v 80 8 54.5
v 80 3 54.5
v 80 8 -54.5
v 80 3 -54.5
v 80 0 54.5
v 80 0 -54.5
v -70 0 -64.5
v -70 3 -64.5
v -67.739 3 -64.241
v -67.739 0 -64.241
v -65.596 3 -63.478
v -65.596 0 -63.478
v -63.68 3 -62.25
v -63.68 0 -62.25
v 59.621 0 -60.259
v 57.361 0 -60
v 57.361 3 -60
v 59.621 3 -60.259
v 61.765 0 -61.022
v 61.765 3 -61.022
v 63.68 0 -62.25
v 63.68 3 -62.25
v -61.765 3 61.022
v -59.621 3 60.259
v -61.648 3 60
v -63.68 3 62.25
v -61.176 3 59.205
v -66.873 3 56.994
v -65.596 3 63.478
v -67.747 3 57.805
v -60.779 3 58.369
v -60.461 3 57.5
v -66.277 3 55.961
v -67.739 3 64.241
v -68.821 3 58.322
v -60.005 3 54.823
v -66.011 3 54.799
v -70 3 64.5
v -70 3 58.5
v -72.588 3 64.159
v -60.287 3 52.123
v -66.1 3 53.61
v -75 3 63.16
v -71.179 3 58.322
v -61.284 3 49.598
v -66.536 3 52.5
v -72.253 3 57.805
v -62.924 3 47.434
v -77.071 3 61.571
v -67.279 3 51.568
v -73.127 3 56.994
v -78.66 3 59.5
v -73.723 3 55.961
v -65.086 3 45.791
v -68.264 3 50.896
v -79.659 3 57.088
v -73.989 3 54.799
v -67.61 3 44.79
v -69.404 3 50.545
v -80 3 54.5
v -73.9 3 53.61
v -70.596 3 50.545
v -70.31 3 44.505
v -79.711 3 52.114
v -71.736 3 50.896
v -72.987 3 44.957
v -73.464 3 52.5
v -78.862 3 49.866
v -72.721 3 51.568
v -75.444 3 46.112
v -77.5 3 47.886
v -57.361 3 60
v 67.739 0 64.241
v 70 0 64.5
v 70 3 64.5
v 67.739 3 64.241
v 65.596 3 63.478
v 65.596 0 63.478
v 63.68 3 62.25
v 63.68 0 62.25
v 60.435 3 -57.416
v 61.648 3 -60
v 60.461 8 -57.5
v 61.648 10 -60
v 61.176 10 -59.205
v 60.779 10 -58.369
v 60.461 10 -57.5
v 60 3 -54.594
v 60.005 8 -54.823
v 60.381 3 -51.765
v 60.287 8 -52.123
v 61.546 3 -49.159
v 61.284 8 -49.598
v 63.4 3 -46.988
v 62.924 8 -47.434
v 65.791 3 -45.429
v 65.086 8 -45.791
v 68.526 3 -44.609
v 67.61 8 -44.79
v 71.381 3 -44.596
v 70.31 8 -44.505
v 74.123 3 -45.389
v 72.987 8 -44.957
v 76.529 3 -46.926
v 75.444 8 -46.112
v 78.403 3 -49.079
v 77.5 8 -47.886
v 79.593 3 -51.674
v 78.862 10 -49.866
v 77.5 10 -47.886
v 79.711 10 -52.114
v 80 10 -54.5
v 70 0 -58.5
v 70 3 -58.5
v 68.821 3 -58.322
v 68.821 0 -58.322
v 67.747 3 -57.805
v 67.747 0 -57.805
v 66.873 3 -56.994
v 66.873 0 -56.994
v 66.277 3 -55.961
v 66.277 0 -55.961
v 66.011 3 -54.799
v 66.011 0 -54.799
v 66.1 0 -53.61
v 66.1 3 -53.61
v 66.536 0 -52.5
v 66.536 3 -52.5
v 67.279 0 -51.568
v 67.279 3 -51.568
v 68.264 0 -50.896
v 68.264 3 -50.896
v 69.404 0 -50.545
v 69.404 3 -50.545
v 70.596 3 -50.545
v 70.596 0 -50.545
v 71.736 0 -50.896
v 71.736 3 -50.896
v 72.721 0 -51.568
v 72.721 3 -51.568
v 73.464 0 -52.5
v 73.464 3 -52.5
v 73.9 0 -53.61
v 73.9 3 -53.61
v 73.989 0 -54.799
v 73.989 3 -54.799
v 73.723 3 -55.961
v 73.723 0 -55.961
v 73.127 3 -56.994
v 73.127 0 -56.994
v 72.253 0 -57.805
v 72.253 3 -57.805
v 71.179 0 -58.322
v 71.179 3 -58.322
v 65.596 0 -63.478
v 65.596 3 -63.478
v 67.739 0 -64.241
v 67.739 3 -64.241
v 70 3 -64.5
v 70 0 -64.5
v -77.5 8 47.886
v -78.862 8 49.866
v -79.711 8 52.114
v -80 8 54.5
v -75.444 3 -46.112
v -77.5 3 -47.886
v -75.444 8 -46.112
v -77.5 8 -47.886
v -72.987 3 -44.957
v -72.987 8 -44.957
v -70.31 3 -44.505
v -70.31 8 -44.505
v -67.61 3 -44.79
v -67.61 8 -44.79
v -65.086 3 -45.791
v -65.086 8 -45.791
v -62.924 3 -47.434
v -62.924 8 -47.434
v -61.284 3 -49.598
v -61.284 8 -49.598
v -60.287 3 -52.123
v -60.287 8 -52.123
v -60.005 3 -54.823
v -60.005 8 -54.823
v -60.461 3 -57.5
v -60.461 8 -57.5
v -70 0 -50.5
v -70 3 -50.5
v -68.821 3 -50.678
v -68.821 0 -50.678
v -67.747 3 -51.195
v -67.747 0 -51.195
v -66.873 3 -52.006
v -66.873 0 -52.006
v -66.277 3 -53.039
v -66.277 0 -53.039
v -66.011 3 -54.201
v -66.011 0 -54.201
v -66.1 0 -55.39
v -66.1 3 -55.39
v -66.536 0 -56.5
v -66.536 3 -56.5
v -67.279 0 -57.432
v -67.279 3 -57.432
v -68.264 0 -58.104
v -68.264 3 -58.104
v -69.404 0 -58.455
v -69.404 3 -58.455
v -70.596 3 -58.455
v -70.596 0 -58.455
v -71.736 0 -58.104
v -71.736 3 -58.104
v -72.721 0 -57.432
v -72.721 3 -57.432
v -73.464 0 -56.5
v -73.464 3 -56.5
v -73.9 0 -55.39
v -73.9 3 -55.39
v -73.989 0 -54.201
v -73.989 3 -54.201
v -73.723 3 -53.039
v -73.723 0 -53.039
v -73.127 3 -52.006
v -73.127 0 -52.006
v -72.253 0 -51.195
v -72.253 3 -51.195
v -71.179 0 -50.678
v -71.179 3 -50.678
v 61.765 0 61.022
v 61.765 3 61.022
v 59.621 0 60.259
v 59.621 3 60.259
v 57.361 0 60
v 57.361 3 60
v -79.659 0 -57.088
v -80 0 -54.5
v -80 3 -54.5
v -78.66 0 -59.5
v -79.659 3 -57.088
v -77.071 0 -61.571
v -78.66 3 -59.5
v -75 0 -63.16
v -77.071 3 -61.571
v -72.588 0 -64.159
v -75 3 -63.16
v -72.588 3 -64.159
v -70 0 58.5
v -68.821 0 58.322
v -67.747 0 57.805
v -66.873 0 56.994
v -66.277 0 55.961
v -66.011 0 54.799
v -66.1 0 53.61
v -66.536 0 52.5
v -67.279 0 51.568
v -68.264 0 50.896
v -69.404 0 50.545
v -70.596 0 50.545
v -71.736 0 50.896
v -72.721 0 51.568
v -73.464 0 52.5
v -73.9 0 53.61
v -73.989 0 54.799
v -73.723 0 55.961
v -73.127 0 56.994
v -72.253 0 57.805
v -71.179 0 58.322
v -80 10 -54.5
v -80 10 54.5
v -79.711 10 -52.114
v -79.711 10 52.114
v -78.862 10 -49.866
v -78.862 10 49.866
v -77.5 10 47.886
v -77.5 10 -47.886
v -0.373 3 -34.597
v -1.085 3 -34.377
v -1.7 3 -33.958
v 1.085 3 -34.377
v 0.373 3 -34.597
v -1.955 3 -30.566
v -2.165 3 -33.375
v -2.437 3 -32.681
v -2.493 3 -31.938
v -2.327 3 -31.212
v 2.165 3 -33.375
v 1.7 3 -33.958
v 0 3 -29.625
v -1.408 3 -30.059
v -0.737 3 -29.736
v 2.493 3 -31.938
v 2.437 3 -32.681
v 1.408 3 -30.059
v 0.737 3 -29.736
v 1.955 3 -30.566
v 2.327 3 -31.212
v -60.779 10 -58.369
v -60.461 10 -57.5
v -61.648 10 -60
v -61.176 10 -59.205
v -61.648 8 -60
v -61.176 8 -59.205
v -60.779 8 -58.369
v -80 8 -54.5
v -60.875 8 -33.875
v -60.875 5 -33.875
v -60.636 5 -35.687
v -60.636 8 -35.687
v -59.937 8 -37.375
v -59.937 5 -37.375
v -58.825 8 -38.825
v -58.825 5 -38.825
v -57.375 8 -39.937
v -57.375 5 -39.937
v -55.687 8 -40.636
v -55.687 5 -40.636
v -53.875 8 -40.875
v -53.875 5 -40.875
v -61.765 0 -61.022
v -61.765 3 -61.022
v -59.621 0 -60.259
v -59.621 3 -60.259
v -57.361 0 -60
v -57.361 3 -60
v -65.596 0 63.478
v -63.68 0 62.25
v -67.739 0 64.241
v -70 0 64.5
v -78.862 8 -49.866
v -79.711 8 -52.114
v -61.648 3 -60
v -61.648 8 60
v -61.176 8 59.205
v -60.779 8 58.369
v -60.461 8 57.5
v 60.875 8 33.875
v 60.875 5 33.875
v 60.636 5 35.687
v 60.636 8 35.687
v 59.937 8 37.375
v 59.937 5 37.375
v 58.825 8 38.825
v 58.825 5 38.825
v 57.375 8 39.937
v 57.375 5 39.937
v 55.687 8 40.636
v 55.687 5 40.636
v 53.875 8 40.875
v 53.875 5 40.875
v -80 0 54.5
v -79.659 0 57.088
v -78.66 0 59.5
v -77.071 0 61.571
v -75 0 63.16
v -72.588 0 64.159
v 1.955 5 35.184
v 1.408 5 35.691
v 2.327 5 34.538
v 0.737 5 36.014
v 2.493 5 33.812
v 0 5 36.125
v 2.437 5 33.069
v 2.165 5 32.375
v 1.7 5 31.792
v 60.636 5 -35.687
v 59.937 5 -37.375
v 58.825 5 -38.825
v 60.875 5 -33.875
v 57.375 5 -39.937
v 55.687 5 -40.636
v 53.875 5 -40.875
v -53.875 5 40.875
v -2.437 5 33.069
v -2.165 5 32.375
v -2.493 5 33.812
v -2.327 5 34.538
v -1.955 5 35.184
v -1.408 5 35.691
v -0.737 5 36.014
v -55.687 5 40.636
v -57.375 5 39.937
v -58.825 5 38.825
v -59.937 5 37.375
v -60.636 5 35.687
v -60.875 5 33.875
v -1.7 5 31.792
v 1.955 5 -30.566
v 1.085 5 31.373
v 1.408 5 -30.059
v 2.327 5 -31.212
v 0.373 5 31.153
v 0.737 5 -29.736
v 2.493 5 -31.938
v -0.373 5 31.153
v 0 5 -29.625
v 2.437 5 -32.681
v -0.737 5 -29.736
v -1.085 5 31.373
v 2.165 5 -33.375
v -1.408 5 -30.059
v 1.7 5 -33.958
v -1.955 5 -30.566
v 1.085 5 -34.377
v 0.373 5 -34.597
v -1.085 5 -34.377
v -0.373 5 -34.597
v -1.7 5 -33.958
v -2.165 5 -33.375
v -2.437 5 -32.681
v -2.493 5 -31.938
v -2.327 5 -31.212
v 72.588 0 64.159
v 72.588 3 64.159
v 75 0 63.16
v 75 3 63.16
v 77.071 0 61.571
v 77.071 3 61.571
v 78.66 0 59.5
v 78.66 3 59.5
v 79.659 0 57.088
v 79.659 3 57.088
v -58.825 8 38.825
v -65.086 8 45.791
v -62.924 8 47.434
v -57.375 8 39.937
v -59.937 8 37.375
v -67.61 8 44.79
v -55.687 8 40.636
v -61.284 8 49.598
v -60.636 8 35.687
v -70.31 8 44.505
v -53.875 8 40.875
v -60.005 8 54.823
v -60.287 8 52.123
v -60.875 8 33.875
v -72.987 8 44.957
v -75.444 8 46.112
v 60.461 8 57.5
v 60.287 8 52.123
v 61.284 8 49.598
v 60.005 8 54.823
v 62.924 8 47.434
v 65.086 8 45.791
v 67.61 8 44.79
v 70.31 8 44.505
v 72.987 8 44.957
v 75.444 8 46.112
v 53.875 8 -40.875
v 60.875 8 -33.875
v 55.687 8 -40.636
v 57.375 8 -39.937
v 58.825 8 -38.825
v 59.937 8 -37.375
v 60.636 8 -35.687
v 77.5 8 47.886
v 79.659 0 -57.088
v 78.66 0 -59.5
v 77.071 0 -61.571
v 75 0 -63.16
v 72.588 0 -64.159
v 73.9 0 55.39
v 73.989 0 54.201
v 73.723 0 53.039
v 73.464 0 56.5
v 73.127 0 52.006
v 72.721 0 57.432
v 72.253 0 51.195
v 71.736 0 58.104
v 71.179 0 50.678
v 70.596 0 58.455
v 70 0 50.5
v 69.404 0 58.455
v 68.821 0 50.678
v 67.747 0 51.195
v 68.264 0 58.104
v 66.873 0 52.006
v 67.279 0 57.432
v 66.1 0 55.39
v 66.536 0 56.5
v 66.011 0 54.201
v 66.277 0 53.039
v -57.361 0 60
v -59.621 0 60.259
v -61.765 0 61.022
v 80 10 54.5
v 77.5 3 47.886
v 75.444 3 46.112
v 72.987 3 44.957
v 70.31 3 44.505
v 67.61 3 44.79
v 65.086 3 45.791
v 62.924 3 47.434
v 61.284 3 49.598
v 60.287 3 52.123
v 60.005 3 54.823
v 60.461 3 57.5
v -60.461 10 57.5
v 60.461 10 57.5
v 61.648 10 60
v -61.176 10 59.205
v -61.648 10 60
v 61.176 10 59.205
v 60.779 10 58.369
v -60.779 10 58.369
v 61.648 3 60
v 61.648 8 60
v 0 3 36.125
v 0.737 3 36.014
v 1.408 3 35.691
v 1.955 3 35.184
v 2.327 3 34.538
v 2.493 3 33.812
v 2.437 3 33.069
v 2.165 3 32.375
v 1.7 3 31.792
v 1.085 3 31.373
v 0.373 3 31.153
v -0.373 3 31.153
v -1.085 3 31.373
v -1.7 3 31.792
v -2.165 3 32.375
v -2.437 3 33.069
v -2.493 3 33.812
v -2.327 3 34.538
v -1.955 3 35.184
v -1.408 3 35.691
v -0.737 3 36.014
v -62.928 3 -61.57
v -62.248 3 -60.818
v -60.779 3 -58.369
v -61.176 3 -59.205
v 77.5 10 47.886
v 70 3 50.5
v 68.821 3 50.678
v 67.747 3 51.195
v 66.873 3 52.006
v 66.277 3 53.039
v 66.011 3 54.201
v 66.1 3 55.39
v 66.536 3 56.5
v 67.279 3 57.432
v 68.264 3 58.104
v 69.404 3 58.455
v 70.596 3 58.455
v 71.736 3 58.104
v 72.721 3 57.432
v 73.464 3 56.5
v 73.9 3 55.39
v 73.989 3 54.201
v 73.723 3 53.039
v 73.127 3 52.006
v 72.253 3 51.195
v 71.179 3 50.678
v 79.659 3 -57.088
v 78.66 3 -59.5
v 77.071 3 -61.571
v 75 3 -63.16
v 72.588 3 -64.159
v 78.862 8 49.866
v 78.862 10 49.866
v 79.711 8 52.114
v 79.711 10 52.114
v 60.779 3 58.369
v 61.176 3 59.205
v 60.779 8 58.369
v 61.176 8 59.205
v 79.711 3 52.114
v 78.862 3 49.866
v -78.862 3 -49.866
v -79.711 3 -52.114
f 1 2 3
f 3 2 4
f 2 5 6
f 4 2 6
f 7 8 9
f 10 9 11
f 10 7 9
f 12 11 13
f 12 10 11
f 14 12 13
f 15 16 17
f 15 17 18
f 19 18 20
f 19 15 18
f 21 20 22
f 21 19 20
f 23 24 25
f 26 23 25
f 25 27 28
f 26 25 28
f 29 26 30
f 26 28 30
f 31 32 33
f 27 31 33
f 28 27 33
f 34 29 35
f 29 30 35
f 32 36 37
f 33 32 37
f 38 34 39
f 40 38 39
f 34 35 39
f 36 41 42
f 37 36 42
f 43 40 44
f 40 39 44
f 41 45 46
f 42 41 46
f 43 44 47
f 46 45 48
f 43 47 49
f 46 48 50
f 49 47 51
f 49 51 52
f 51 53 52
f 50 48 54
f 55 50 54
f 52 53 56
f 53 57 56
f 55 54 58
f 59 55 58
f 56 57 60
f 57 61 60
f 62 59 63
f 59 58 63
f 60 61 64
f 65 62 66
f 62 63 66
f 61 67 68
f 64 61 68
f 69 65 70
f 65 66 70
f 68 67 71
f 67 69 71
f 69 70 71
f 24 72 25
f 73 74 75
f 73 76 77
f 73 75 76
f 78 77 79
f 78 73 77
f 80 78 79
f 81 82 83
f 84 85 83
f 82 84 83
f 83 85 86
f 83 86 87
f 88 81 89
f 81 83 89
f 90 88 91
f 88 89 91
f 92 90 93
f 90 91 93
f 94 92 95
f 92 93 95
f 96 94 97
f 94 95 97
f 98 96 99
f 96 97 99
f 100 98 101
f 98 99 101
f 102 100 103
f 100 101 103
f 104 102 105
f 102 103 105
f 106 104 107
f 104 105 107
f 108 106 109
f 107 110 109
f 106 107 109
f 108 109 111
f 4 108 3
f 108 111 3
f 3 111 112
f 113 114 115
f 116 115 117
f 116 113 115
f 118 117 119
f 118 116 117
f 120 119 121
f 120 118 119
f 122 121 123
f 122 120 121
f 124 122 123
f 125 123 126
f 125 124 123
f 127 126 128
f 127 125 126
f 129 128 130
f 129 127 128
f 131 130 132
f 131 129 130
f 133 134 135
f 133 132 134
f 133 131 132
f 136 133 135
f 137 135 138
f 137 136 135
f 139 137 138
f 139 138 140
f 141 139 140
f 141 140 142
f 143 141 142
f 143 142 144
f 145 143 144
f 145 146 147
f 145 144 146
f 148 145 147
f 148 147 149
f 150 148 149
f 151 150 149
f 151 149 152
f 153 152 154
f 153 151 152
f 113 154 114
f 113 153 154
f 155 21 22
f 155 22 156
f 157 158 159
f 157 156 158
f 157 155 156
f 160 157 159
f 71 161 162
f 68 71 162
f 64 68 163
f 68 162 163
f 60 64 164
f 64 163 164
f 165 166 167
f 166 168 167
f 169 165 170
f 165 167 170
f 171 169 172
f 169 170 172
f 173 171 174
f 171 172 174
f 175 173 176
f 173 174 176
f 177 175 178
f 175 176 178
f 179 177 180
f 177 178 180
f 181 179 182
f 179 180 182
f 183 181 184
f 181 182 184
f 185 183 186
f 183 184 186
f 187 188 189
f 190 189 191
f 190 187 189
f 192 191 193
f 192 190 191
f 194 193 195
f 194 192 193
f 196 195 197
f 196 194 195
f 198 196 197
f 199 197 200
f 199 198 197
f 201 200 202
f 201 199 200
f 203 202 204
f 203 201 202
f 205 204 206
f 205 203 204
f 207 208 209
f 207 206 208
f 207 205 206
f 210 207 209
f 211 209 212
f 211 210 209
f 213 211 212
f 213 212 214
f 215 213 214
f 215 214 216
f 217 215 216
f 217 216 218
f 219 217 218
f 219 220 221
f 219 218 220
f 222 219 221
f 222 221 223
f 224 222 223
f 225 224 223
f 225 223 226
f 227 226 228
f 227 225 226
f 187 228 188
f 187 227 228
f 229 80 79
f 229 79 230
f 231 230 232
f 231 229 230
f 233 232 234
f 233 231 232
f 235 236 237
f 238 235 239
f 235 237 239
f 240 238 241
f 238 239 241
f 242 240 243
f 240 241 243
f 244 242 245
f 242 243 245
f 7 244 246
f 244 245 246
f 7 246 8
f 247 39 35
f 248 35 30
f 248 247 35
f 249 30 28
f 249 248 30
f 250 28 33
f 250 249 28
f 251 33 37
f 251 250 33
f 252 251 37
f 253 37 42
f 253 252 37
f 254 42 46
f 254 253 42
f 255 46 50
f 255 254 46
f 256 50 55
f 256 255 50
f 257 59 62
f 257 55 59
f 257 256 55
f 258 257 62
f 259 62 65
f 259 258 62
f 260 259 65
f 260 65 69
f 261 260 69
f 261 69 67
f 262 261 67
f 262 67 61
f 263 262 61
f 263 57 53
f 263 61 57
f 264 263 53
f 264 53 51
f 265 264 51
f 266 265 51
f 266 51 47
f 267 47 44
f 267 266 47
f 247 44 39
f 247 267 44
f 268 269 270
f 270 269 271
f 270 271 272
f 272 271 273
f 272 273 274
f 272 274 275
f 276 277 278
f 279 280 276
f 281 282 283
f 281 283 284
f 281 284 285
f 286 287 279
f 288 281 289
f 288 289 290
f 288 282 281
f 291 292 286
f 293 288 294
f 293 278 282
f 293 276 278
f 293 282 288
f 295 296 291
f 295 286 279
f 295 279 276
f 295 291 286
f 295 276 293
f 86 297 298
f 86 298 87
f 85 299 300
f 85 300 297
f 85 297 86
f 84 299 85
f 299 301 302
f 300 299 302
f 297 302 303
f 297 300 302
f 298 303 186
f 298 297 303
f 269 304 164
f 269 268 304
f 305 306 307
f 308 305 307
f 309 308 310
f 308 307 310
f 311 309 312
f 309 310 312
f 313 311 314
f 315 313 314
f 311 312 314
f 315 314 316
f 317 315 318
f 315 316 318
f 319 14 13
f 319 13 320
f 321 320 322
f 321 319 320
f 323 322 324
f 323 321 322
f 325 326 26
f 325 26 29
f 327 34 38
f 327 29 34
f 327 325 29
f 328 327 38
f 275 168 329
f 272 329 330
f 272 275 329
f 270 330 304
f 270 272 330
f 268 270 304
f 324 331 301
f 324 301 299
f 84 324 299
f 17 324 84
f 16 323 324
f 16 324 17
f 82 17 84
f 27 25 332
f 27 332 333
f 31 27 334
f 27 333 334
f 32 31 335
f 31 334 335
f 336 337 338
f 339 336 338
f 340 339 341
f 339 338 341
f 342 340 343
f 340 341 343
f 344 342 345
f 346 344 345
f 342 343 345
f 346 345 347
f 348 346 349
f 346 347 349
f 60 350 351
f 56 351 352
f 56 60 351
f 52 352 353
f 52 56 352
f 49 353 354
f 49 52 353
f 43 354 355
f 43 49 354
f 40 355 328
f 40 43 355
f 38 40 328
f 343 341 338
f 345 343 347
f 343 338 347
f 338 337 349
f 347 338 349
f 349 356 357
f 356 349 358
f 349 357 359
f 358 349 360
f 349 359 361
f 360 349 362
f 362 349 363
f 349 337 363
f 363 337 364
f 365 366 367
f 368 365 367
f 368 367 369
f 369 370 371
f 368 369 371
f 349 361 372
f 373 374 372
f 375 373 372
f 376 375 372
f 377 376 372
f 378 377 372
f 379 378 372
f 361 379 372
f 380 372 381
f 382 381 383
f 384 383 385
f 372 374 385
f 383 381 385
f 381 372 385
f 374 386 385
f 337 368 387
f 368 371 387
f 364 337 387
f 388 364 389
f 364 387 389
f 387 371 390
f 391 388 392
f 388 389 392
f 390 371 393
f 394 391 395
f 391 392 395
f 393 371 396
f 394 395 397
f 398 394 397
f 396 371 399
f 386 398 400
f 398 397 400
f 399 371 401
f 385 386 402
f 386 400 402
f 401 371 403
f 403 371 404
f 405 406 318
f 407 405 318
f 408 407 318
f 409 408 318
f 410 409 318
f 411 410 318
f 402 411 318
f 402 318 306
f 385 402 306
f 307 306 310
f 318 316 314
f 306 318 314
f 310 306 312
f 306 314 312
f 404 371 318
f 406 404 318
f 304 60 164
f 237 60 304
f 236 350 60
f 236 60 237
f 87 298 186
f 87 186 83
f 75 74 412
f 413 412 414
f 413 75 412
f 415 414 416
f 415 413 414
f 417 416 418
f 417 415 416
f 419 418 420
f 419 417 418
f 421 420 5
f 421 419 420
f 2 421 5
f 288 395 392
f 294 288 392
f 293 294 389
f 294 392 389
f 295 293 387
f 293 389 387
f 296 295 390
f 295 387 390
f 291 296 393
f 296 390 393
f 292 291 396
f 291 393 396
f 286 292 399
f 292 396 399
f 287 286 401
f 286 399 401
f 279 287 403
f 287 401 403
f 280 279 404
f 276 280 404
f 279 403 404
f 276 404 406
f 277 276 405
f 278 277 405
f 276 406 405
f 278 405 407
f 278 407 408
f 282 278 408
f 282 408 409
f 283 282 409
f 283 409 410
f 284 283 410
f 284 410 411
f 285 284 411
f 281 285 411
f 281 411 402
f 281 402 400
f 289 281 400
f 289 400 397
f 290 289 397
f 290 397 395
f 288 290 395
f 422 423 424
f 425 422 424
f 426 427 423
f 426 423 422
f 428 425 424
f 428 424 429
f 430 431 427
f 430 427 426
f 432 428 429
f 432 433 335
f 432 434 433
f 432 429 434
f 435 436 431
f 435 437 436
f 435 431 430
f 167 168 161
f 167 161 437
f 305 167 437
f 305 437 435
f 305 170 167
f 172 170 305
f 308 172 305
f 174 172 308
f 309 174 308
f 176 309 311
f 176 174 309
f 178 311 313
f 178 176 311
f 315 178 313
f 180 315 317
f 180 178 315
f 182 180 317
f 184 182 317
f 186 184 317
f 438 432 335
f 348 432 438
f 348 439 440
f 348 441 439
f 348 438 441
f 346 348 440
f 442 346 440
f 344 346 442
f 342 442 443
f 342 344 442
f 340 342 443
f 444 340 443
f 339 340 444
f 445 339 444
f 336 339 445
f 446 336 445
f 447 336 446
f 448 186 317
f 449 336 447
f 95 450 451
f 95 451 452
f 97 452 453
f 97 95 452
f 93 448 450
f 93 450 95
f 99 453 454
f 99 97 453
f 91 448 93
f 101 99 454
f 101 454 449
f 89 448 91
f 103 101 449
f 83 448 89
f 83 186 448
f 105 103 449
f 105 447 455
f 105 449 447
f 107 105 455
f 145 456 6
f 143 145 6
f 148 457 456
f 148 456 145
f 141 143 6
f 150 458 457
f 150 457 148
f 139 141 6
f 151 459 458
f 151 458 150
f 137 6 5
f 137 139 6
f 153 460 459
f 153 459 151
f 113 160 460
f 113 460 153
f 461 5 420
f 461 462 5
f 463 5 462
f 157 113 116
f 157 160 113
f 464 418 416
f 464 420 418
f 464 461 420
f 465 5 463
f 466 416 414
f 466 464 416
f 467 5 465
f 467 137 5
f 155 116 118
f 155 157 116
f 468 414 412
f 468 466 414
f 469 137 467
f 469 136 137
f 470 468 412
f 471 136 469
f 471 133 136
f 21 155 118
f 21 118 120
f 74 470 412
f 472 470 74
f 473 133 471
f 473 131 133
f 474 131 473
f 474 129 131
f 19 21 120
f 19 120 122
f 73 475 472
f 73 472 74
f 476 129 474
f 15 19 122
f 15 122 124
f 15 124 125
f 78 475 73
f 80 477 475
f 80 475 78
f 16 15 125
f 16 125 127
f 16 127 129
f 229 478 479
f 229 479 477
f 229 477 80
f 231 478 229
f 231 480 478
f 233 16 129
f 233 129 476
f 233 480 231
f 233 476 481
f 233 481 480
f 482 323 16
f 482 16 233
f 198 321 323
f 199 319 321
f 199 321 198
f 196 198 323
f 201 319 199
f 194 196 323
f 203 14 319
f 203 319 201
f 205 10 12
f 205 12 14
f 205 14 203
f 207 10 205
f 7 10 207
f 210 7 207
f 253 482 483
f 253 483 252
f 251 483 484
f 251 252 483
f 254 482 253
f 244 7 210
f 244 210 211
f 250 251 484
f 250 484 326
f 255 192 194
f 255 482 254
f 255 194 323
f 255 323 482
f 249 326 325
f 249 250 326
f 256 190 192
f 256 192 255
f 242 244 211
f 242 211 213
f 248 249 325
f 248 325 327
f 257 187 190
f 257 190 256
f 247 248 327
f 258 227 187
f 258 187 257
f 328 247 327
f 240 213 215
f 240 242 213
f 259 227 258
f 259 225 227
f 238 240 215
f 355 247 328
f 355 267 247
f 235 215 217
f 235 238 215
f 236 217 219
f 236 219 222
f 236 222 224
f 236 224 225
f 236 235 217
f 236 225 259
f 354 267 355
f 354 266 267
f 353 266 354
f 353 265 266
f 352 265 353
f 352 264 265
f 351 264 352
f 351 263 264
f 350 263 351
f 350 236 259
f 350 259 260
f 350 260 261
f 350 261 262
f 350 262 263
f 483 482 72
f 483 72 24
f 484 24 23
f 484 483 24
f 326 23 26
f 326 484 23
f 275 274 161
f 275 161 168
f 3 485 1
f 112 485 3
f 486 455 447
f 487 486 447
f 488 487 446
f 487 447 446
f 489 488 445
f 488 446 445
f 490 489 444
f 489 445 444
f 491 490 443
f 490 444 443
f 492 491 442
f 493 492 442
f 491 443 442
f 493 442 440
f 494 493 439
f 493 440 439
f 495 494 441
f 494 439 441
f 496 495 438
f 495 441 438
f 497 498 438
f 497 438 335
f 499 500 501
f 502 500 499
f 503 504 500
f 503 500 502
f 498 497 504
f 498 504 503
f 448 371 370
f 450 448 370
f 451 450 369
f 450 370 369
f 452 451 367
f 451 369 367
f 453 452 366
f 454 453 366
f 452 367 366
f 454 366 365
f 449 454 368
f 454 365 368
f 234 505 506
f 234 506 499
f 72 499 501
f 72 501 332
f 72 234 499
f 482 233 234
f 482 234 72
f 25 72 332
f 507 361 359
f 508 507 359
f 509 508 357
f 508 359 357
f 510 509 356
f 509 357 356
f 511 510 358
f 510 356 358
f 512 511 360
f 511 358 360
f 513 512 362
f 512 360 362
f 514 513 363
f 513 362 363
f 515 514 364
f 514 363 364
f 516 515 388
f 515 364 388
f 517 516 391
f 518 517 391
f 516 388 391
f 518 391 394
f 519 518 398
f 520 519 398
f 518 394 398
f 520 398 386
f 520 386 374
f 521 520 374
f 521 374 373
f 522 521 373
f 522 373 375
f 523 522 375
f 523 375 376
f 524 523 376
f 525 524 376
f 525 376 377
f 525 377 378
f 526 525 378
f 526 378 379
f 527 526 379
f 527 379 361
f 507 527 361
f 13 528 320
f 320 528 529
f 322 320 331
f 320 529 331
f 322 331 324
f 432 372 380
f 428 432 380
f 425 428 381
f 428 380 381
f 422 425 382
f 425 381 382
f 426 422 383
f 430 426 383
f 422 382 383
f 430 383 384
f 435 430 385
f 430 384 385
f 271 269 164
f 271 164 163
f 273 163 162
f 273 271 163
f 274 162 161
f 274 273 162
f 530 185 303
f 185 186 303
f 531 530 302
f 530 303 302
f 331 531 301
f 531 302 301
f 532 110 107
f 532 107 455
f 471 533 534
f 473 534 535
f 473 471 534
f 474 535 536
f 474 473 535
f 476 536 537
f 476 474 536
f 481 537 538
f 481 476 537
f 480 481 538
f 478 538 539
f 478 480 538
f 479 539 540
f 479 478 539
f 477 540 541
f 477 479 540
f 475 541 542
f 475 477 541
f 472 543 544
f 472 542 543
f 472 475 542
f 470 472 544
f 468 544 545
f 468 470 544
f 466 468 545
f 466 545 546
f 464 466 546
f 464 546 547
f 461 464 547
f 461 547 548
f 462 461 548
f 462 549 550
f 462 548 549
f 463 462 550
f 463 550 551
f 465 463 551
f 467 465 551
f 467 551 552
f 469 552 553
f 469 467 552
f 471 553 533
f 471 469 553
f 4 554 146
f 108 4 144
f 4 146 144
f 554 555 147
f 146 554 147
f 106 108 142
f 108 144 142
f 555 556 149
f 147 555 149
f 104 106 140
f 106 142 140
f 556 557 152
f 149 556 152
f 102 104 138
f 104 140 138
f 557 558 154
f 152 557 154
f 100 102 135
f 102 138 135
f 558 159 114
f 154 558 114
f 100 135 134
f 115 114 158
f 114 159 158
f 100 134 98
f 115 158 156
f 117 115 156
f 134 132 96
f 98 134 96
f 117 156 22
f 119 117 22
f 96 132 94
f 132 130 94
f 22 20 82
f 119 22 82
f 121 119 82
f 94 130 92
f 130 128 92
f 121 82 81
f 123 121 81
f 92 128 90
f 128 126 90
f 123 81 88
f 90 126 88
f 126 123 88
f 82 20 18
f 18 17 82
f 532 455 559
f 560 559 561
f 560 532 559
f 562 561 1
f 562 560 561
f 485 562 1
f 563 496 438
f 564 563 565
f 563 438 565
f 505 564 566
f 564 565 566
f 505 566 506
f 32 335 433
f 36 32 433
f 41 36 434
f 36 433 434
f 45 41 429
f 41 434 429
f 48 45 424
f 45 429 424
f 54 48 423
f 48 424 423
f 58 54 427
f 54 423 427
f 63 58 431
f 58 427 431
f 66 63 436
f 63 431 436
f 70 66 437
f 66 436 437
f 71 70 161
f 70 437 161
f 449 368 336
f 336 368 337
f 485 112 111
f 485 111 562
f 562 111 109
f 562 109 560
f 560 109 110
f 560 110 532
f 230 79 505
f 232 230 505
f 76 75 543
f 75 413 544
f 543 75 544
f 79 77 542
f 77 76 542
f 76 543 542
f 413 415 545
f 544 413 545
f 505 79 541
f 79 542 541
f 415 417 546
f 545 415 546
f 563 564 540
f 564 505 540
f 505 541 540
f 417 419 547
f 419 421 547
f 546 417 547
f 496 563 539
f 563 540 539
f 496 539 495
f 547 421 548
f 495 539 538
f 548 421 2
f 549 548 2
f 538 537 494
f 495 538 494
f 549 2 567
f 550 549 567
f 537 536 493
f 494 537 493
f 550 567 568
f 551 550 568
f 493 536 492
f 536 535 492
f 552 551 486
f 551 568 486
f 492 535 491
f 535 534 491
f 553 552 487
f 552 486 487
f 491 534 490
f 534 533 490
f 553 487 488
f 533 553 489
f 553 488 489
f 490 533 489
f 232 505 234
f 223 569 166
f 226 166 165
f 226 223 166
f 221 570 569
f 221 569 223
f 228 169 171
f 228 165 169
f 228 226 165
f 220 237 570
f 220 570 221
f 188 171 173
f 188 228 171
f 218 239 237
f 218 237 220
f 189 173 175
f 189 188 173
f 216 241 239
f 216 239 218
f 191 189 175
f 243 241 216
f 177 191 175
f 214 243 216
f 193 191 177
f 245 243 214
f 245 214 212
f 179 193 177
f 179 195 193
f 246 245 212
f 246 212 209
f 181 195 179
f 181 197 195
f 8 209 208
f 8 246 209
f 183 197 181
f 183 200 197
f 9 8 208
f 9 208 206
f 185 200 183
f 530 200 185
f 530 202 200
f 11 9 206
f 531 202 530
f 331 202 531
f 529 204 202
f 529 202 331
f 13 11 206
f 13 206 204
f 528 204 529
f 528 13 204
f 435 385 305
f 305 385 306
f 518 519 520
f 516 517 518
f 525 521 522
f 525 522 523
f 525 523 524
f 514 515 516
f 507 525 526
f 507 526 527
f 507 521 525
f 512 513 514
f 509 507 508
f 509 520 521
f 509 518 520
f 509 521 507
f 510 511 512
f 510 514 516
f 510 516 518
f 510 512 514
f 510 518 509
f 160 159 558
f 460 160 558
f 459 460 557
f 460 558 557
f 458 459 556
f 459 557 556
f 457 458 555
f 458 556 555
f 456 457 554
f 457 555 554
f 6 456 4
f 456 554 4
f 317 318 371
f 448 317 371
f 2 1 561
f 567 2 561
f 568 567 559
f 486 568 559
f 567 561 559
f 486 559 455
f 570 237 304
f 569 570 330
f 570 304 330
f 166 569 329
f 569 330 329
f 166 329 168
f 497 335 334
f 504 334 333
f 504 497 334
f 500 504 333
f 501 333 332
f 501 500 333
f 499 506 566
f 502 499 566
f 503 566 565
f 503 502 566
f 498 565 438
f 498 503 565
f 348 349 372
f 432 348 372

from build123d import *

# Parameters (mm, degrees)
SKETCH1_W               = 160
SKETCH1_H               = 129
BOSS_EXTRUDE1_DEPTH     = 8
SKETCH1_3_R             = 4
CUT_EXTRUDE2_DEPTH      = 104.074002542
FILLET1_R               = 10
CUT_EXTRUDE4_DEPTH      = 1
CUT_EXTRUDE4_DEPTH_BACK = 3
CUT_EXTRUDE4_START      = 8
CUT_EXTRUDE9_DEPTH      = 104.074002542
CUT_EXTRUDE10_START     = 8
SKETCH1_17_R            = 2.5
SKETCH1_17_R_2          = 10
CUT_EXTRUDE10_DEPTH     = 5
BOSS_EXTRUDE4_START     = 10
BOSS_EXTRUDE4_DEPTH     = 10
FILLET2_R               = 10


with BuildPart() as part:
    # Sketch1 → Boss-Extrude1 (new body)
    with BuildSketch(Plane(origin=(0, 0, 0), x_dir=(1, 0, 0), z_dir=(0, 1, 0))):
        Rectangle(SKETCH1_W, SKETCH1_H)
    extrude(amount=BOSS_EXTRUDE1_DEPTH)

    # Sketch1<3> → Cut-Extrude2 (cut, through all)
    with BuildSketch(Plane(origin=(0, 0, 0), x_dir=(1, 0, 0), z_dir=(0, 1, 0))):
        with Locations(Location((-70, 54.5, 0), (0, 0, 270))):
            Circle(SKETCH1_3_R)
        with Locations(Location((-70, -54.5, 0), (0, 0, 270))):
            Circle(SKETCH1_3_R)
        with Locations(Location((70, -54.5, 0), (0, 0, 90))):
            Circle(SKETCH1_3_R)
        with Locations(Location((70, 54.5, 0), (0, 0, 90))):
            Circle(SKETCH1_3_R)
    extrude(amount=CUT_EXTRUDE2_DEPTH, mode=Mode.SUBTRACT)

    # Fillet1
    fillet1_edges = [part.edges().sort_by_distance(p)[0] for p in [
        (80, 4, 64.5),
        (-80, 4, 64.5),
        (-80, 4, -64.5),
        (80, 4, -64.5),
    ]]
    fillet(fillet1_edges, radius=FILLET1_R)

    # Sketch1<11> → Cut-Extrude4 (cut, two sides: drawn at the far end of the back side and taken through both)
    with BuildSketch(Plane(origin=(0, 0, 0), x_dir=(1, 0, 0), z_dir=(0, 1, 0)).offset(CUT_EXTRUDE4_START - CUT_EXTRUDE4_DEPTH_BACK)):
        with BuildLine():
            Line((53.875, -40.875), (-53.875, -40.875))
            ThreePointArc((-53.875, -40.875), (-58.824747468, -38.824747468), (-60.875, -33.875))
            Line((-60.875, -33.875), (-60.875, 33.875))
            ThreePointArc((-60.875, 33.875), (-58.824747468, 38.824747468), (-53.875, 40.875))
            Line((-53.875, 40.875), (53.875, 40.875))
            ThreePointArc((53.875, 40.875), (58.824747468, 38.824747468), (60.875, 33.875))
            Line((60.875, 33.875), (60.875, -33.875))
            ThreePointArc((60.875, -33.875), (58.824747468, -38.824747468), (53.875, -40.875))
        make_face()
    extrude(amount=CUT_EXTRUDE4_DEPTH + CUT_EXTRUDE4_DEPTH_BACK, mode=Mode.SUBTRACT)

    # Sketch1<13> → Cut-Extrude9 (cut, through all)
    with BuildSketch(Plane(origin=(0, 0, 0), x_dir=(1, 0, 0), z_dir=(0, 1, 0))):
        with BuildLine():
            Line((-70, -64.5), (70, -64.5))
            ThreePointArc((70, -64.5), (65.25658351, -63.303408431), (61.648353456, -60))
            Line((61.648353456, -60), (-61.648353456, -60))
            ThreePointArc((-61.648353456, -60), (-65.25658351, -63.303408431), (-70, -64.5))
        make_face()
        with BuildLine():
            ThreePointArc((61.648353456, 60), (65.25658351, 63.303408431), (70, 64.5))
            Line((70, 64.5), (-69.999999984, 64.5))
            ThreePointArc((-69.999999984, 64.5), (-65.256583502, 63.303408427), (-61.648353456, 60))
            Line((-61.648353456, 60), (61.648353456, 60))
        make_face()
    extrude(amount=CUT_EXTRUDE9_DEPTH, mode=Mode.SUBTRACT)

    # Sketch1<17> → Cut-Extrude10 (cut)
    with BuildSketch(Plane(origin=(0, 0, 0), x_dir=(1, 0, 0), z_dir=(0, 1, 0)).offset(CUT_EXTRUDE10_START)):
        with Locations(Location((0, 32.125, 0), (0, 0, 270))):
            Circle(SKETCH1_17_R)
        with Locations((-70, 54.5)):
            Circle(SKETCH1_17_R_2)
        with Locations((70, 54.5)):
            Circle(SKETCH1_17_R_2)
        with Locations((-70, -54.5)):
            Circle(SKETCH1_17_R_2)
        with Locations((70, -54.5)):
            Circle(SKETCH1_17_R_2)
        with Locations(Location((0, -33.625, 0), (0, 0, 270))):
            Circle(SKETCH1_17_R)
    extrude(amount=-CUT_EXTRUDE10_DEPTH, mode=Mode.SUBTRACT)

    # Sketch1<18> → Boss-Extrude4 (add)
    with BuildSketch(Plane(origin=(0, 0, 0), x_dir=(1, 0, 0), z_dir=(0, 1, 0)).offset(BOSS_EXTRUDE4_START)):
        with BuildLine():
            ThreePointArc((60.460607986, 57.5), (60.967568701, 58.791291743), (61.648353456, 60))
            Line((61.648353456, 60), (-61.648353456, 60))
            ThreePointArc((-61.648353456, 60), (-60.967568701, 58.791291743), (-60.460607986, 57.5))
            Line((-60.460607986, 57.5), (60.460607986, 57.5))
        make_face()
        with BuildLine():
            Line((-80, 54.500000177), (-80, -54.5))
            ThreePointArc((-80, -54.5), (-79.354143467, -50.964466094), (-77.5, -47.885621722))
            Line((-77.5, -47.885621722), (-77.5, 47.885621722))
            ThreePointArc((-77.5, 47.885621722), (-79.354143498, 50.964466177), (-80, 54.500000177))
        make_face()
        with BuildLine():
            ThreePointArc((77.5, -47.885621722), (79.354143467, -50.964466094), (80, -54.5))
            Line((80, -54.5), (80, 54.5))
            ThreePointArc((80, 54.5), (79.354143467, 50.964466094), (77.5, 47.885621722))
            Line((77.5, 47.885621722), (77.5, -47.885621722))
        make_face()
        with BuildLine():
            Line((-61.648353456, -60), (61.648353456, -60))
            ThreePointArc((61.648353456, -60), (60.967568701, -58.791291743), (60.460607986, -57.5))
            Line((60.460607986, -57.5), (-60.460607986, -57.5))
            ThreePointArc((-60.460607986, -57.5), (-60.967568701, -58.791291743), (-61.648353456, -60))
        make_face()
    extrude(amount=-BOSS_EXTRUDE4_DEPTH)

    # Fillet2
    # the kernel refuses this fillet: 10 mm, written as the material it adds along each edge
    with BuildSketch(Plane(origin=(61.648353456, 0, 60), x_dir=(0.6702455950029323, 0, 0.7421393685684416), z_dir=(0, 1, 0)), Plane(origin=(-61.648353456, 0, -60), x_dir=(-0.6702455950029282, 0, -0.7421393685684453), z_dir=(0, 1, 0))) as fillet2_piece_1:
        with BuildLine():
            CenterArc((4.547663341, -9.884436465), FILLET2_R, 98.719009802, 39.194967426)
            Line((-2.873730345, -3.181980515), (0, 0))
            ThreePointArc((0, 0), (1.51588778, -0.115563535), (3.03177556, 0))
        make_face()
    extrude(amount=3)
    with BuildSketch(Plane(origin=(-61.648353456, 0, 60), x_dir=(1, 0, 0), z_dir=(0, 1, 0))) as fillet2_piece_2:
        with BuildLine():
            CenterArc((4.287578116, -10), FILLET2_R, 90, 39.194967426)
            ThreePointArc((-2.032034214, -2.25), (-0.930252859, -1.20245595), (0, 0))
            Line((0, 0), (4.287578116, 0))
        make_face()
    extrude(amount=3)
    with BuildSketch(Plane(origin=(61.648353456, 0, -60), x_dir=(0.6702455950029361, 0, -0.7421393685684381), z_dir=(0, 1, 0))) as fillet2_piece_3:
        with BuildLine():
            CenterArc((4.547663341, 9.884436465), FILLET2_R, 222.086022772, 39.194967426)
            Line((-2.873730345, 3.181980515), (0, 0))
            ThreePointArc((0, 0), (1.51588778, 0.115563535), (3.03177556, 0))
        make_face()
    extrude(amount=3)


solid = part.part
